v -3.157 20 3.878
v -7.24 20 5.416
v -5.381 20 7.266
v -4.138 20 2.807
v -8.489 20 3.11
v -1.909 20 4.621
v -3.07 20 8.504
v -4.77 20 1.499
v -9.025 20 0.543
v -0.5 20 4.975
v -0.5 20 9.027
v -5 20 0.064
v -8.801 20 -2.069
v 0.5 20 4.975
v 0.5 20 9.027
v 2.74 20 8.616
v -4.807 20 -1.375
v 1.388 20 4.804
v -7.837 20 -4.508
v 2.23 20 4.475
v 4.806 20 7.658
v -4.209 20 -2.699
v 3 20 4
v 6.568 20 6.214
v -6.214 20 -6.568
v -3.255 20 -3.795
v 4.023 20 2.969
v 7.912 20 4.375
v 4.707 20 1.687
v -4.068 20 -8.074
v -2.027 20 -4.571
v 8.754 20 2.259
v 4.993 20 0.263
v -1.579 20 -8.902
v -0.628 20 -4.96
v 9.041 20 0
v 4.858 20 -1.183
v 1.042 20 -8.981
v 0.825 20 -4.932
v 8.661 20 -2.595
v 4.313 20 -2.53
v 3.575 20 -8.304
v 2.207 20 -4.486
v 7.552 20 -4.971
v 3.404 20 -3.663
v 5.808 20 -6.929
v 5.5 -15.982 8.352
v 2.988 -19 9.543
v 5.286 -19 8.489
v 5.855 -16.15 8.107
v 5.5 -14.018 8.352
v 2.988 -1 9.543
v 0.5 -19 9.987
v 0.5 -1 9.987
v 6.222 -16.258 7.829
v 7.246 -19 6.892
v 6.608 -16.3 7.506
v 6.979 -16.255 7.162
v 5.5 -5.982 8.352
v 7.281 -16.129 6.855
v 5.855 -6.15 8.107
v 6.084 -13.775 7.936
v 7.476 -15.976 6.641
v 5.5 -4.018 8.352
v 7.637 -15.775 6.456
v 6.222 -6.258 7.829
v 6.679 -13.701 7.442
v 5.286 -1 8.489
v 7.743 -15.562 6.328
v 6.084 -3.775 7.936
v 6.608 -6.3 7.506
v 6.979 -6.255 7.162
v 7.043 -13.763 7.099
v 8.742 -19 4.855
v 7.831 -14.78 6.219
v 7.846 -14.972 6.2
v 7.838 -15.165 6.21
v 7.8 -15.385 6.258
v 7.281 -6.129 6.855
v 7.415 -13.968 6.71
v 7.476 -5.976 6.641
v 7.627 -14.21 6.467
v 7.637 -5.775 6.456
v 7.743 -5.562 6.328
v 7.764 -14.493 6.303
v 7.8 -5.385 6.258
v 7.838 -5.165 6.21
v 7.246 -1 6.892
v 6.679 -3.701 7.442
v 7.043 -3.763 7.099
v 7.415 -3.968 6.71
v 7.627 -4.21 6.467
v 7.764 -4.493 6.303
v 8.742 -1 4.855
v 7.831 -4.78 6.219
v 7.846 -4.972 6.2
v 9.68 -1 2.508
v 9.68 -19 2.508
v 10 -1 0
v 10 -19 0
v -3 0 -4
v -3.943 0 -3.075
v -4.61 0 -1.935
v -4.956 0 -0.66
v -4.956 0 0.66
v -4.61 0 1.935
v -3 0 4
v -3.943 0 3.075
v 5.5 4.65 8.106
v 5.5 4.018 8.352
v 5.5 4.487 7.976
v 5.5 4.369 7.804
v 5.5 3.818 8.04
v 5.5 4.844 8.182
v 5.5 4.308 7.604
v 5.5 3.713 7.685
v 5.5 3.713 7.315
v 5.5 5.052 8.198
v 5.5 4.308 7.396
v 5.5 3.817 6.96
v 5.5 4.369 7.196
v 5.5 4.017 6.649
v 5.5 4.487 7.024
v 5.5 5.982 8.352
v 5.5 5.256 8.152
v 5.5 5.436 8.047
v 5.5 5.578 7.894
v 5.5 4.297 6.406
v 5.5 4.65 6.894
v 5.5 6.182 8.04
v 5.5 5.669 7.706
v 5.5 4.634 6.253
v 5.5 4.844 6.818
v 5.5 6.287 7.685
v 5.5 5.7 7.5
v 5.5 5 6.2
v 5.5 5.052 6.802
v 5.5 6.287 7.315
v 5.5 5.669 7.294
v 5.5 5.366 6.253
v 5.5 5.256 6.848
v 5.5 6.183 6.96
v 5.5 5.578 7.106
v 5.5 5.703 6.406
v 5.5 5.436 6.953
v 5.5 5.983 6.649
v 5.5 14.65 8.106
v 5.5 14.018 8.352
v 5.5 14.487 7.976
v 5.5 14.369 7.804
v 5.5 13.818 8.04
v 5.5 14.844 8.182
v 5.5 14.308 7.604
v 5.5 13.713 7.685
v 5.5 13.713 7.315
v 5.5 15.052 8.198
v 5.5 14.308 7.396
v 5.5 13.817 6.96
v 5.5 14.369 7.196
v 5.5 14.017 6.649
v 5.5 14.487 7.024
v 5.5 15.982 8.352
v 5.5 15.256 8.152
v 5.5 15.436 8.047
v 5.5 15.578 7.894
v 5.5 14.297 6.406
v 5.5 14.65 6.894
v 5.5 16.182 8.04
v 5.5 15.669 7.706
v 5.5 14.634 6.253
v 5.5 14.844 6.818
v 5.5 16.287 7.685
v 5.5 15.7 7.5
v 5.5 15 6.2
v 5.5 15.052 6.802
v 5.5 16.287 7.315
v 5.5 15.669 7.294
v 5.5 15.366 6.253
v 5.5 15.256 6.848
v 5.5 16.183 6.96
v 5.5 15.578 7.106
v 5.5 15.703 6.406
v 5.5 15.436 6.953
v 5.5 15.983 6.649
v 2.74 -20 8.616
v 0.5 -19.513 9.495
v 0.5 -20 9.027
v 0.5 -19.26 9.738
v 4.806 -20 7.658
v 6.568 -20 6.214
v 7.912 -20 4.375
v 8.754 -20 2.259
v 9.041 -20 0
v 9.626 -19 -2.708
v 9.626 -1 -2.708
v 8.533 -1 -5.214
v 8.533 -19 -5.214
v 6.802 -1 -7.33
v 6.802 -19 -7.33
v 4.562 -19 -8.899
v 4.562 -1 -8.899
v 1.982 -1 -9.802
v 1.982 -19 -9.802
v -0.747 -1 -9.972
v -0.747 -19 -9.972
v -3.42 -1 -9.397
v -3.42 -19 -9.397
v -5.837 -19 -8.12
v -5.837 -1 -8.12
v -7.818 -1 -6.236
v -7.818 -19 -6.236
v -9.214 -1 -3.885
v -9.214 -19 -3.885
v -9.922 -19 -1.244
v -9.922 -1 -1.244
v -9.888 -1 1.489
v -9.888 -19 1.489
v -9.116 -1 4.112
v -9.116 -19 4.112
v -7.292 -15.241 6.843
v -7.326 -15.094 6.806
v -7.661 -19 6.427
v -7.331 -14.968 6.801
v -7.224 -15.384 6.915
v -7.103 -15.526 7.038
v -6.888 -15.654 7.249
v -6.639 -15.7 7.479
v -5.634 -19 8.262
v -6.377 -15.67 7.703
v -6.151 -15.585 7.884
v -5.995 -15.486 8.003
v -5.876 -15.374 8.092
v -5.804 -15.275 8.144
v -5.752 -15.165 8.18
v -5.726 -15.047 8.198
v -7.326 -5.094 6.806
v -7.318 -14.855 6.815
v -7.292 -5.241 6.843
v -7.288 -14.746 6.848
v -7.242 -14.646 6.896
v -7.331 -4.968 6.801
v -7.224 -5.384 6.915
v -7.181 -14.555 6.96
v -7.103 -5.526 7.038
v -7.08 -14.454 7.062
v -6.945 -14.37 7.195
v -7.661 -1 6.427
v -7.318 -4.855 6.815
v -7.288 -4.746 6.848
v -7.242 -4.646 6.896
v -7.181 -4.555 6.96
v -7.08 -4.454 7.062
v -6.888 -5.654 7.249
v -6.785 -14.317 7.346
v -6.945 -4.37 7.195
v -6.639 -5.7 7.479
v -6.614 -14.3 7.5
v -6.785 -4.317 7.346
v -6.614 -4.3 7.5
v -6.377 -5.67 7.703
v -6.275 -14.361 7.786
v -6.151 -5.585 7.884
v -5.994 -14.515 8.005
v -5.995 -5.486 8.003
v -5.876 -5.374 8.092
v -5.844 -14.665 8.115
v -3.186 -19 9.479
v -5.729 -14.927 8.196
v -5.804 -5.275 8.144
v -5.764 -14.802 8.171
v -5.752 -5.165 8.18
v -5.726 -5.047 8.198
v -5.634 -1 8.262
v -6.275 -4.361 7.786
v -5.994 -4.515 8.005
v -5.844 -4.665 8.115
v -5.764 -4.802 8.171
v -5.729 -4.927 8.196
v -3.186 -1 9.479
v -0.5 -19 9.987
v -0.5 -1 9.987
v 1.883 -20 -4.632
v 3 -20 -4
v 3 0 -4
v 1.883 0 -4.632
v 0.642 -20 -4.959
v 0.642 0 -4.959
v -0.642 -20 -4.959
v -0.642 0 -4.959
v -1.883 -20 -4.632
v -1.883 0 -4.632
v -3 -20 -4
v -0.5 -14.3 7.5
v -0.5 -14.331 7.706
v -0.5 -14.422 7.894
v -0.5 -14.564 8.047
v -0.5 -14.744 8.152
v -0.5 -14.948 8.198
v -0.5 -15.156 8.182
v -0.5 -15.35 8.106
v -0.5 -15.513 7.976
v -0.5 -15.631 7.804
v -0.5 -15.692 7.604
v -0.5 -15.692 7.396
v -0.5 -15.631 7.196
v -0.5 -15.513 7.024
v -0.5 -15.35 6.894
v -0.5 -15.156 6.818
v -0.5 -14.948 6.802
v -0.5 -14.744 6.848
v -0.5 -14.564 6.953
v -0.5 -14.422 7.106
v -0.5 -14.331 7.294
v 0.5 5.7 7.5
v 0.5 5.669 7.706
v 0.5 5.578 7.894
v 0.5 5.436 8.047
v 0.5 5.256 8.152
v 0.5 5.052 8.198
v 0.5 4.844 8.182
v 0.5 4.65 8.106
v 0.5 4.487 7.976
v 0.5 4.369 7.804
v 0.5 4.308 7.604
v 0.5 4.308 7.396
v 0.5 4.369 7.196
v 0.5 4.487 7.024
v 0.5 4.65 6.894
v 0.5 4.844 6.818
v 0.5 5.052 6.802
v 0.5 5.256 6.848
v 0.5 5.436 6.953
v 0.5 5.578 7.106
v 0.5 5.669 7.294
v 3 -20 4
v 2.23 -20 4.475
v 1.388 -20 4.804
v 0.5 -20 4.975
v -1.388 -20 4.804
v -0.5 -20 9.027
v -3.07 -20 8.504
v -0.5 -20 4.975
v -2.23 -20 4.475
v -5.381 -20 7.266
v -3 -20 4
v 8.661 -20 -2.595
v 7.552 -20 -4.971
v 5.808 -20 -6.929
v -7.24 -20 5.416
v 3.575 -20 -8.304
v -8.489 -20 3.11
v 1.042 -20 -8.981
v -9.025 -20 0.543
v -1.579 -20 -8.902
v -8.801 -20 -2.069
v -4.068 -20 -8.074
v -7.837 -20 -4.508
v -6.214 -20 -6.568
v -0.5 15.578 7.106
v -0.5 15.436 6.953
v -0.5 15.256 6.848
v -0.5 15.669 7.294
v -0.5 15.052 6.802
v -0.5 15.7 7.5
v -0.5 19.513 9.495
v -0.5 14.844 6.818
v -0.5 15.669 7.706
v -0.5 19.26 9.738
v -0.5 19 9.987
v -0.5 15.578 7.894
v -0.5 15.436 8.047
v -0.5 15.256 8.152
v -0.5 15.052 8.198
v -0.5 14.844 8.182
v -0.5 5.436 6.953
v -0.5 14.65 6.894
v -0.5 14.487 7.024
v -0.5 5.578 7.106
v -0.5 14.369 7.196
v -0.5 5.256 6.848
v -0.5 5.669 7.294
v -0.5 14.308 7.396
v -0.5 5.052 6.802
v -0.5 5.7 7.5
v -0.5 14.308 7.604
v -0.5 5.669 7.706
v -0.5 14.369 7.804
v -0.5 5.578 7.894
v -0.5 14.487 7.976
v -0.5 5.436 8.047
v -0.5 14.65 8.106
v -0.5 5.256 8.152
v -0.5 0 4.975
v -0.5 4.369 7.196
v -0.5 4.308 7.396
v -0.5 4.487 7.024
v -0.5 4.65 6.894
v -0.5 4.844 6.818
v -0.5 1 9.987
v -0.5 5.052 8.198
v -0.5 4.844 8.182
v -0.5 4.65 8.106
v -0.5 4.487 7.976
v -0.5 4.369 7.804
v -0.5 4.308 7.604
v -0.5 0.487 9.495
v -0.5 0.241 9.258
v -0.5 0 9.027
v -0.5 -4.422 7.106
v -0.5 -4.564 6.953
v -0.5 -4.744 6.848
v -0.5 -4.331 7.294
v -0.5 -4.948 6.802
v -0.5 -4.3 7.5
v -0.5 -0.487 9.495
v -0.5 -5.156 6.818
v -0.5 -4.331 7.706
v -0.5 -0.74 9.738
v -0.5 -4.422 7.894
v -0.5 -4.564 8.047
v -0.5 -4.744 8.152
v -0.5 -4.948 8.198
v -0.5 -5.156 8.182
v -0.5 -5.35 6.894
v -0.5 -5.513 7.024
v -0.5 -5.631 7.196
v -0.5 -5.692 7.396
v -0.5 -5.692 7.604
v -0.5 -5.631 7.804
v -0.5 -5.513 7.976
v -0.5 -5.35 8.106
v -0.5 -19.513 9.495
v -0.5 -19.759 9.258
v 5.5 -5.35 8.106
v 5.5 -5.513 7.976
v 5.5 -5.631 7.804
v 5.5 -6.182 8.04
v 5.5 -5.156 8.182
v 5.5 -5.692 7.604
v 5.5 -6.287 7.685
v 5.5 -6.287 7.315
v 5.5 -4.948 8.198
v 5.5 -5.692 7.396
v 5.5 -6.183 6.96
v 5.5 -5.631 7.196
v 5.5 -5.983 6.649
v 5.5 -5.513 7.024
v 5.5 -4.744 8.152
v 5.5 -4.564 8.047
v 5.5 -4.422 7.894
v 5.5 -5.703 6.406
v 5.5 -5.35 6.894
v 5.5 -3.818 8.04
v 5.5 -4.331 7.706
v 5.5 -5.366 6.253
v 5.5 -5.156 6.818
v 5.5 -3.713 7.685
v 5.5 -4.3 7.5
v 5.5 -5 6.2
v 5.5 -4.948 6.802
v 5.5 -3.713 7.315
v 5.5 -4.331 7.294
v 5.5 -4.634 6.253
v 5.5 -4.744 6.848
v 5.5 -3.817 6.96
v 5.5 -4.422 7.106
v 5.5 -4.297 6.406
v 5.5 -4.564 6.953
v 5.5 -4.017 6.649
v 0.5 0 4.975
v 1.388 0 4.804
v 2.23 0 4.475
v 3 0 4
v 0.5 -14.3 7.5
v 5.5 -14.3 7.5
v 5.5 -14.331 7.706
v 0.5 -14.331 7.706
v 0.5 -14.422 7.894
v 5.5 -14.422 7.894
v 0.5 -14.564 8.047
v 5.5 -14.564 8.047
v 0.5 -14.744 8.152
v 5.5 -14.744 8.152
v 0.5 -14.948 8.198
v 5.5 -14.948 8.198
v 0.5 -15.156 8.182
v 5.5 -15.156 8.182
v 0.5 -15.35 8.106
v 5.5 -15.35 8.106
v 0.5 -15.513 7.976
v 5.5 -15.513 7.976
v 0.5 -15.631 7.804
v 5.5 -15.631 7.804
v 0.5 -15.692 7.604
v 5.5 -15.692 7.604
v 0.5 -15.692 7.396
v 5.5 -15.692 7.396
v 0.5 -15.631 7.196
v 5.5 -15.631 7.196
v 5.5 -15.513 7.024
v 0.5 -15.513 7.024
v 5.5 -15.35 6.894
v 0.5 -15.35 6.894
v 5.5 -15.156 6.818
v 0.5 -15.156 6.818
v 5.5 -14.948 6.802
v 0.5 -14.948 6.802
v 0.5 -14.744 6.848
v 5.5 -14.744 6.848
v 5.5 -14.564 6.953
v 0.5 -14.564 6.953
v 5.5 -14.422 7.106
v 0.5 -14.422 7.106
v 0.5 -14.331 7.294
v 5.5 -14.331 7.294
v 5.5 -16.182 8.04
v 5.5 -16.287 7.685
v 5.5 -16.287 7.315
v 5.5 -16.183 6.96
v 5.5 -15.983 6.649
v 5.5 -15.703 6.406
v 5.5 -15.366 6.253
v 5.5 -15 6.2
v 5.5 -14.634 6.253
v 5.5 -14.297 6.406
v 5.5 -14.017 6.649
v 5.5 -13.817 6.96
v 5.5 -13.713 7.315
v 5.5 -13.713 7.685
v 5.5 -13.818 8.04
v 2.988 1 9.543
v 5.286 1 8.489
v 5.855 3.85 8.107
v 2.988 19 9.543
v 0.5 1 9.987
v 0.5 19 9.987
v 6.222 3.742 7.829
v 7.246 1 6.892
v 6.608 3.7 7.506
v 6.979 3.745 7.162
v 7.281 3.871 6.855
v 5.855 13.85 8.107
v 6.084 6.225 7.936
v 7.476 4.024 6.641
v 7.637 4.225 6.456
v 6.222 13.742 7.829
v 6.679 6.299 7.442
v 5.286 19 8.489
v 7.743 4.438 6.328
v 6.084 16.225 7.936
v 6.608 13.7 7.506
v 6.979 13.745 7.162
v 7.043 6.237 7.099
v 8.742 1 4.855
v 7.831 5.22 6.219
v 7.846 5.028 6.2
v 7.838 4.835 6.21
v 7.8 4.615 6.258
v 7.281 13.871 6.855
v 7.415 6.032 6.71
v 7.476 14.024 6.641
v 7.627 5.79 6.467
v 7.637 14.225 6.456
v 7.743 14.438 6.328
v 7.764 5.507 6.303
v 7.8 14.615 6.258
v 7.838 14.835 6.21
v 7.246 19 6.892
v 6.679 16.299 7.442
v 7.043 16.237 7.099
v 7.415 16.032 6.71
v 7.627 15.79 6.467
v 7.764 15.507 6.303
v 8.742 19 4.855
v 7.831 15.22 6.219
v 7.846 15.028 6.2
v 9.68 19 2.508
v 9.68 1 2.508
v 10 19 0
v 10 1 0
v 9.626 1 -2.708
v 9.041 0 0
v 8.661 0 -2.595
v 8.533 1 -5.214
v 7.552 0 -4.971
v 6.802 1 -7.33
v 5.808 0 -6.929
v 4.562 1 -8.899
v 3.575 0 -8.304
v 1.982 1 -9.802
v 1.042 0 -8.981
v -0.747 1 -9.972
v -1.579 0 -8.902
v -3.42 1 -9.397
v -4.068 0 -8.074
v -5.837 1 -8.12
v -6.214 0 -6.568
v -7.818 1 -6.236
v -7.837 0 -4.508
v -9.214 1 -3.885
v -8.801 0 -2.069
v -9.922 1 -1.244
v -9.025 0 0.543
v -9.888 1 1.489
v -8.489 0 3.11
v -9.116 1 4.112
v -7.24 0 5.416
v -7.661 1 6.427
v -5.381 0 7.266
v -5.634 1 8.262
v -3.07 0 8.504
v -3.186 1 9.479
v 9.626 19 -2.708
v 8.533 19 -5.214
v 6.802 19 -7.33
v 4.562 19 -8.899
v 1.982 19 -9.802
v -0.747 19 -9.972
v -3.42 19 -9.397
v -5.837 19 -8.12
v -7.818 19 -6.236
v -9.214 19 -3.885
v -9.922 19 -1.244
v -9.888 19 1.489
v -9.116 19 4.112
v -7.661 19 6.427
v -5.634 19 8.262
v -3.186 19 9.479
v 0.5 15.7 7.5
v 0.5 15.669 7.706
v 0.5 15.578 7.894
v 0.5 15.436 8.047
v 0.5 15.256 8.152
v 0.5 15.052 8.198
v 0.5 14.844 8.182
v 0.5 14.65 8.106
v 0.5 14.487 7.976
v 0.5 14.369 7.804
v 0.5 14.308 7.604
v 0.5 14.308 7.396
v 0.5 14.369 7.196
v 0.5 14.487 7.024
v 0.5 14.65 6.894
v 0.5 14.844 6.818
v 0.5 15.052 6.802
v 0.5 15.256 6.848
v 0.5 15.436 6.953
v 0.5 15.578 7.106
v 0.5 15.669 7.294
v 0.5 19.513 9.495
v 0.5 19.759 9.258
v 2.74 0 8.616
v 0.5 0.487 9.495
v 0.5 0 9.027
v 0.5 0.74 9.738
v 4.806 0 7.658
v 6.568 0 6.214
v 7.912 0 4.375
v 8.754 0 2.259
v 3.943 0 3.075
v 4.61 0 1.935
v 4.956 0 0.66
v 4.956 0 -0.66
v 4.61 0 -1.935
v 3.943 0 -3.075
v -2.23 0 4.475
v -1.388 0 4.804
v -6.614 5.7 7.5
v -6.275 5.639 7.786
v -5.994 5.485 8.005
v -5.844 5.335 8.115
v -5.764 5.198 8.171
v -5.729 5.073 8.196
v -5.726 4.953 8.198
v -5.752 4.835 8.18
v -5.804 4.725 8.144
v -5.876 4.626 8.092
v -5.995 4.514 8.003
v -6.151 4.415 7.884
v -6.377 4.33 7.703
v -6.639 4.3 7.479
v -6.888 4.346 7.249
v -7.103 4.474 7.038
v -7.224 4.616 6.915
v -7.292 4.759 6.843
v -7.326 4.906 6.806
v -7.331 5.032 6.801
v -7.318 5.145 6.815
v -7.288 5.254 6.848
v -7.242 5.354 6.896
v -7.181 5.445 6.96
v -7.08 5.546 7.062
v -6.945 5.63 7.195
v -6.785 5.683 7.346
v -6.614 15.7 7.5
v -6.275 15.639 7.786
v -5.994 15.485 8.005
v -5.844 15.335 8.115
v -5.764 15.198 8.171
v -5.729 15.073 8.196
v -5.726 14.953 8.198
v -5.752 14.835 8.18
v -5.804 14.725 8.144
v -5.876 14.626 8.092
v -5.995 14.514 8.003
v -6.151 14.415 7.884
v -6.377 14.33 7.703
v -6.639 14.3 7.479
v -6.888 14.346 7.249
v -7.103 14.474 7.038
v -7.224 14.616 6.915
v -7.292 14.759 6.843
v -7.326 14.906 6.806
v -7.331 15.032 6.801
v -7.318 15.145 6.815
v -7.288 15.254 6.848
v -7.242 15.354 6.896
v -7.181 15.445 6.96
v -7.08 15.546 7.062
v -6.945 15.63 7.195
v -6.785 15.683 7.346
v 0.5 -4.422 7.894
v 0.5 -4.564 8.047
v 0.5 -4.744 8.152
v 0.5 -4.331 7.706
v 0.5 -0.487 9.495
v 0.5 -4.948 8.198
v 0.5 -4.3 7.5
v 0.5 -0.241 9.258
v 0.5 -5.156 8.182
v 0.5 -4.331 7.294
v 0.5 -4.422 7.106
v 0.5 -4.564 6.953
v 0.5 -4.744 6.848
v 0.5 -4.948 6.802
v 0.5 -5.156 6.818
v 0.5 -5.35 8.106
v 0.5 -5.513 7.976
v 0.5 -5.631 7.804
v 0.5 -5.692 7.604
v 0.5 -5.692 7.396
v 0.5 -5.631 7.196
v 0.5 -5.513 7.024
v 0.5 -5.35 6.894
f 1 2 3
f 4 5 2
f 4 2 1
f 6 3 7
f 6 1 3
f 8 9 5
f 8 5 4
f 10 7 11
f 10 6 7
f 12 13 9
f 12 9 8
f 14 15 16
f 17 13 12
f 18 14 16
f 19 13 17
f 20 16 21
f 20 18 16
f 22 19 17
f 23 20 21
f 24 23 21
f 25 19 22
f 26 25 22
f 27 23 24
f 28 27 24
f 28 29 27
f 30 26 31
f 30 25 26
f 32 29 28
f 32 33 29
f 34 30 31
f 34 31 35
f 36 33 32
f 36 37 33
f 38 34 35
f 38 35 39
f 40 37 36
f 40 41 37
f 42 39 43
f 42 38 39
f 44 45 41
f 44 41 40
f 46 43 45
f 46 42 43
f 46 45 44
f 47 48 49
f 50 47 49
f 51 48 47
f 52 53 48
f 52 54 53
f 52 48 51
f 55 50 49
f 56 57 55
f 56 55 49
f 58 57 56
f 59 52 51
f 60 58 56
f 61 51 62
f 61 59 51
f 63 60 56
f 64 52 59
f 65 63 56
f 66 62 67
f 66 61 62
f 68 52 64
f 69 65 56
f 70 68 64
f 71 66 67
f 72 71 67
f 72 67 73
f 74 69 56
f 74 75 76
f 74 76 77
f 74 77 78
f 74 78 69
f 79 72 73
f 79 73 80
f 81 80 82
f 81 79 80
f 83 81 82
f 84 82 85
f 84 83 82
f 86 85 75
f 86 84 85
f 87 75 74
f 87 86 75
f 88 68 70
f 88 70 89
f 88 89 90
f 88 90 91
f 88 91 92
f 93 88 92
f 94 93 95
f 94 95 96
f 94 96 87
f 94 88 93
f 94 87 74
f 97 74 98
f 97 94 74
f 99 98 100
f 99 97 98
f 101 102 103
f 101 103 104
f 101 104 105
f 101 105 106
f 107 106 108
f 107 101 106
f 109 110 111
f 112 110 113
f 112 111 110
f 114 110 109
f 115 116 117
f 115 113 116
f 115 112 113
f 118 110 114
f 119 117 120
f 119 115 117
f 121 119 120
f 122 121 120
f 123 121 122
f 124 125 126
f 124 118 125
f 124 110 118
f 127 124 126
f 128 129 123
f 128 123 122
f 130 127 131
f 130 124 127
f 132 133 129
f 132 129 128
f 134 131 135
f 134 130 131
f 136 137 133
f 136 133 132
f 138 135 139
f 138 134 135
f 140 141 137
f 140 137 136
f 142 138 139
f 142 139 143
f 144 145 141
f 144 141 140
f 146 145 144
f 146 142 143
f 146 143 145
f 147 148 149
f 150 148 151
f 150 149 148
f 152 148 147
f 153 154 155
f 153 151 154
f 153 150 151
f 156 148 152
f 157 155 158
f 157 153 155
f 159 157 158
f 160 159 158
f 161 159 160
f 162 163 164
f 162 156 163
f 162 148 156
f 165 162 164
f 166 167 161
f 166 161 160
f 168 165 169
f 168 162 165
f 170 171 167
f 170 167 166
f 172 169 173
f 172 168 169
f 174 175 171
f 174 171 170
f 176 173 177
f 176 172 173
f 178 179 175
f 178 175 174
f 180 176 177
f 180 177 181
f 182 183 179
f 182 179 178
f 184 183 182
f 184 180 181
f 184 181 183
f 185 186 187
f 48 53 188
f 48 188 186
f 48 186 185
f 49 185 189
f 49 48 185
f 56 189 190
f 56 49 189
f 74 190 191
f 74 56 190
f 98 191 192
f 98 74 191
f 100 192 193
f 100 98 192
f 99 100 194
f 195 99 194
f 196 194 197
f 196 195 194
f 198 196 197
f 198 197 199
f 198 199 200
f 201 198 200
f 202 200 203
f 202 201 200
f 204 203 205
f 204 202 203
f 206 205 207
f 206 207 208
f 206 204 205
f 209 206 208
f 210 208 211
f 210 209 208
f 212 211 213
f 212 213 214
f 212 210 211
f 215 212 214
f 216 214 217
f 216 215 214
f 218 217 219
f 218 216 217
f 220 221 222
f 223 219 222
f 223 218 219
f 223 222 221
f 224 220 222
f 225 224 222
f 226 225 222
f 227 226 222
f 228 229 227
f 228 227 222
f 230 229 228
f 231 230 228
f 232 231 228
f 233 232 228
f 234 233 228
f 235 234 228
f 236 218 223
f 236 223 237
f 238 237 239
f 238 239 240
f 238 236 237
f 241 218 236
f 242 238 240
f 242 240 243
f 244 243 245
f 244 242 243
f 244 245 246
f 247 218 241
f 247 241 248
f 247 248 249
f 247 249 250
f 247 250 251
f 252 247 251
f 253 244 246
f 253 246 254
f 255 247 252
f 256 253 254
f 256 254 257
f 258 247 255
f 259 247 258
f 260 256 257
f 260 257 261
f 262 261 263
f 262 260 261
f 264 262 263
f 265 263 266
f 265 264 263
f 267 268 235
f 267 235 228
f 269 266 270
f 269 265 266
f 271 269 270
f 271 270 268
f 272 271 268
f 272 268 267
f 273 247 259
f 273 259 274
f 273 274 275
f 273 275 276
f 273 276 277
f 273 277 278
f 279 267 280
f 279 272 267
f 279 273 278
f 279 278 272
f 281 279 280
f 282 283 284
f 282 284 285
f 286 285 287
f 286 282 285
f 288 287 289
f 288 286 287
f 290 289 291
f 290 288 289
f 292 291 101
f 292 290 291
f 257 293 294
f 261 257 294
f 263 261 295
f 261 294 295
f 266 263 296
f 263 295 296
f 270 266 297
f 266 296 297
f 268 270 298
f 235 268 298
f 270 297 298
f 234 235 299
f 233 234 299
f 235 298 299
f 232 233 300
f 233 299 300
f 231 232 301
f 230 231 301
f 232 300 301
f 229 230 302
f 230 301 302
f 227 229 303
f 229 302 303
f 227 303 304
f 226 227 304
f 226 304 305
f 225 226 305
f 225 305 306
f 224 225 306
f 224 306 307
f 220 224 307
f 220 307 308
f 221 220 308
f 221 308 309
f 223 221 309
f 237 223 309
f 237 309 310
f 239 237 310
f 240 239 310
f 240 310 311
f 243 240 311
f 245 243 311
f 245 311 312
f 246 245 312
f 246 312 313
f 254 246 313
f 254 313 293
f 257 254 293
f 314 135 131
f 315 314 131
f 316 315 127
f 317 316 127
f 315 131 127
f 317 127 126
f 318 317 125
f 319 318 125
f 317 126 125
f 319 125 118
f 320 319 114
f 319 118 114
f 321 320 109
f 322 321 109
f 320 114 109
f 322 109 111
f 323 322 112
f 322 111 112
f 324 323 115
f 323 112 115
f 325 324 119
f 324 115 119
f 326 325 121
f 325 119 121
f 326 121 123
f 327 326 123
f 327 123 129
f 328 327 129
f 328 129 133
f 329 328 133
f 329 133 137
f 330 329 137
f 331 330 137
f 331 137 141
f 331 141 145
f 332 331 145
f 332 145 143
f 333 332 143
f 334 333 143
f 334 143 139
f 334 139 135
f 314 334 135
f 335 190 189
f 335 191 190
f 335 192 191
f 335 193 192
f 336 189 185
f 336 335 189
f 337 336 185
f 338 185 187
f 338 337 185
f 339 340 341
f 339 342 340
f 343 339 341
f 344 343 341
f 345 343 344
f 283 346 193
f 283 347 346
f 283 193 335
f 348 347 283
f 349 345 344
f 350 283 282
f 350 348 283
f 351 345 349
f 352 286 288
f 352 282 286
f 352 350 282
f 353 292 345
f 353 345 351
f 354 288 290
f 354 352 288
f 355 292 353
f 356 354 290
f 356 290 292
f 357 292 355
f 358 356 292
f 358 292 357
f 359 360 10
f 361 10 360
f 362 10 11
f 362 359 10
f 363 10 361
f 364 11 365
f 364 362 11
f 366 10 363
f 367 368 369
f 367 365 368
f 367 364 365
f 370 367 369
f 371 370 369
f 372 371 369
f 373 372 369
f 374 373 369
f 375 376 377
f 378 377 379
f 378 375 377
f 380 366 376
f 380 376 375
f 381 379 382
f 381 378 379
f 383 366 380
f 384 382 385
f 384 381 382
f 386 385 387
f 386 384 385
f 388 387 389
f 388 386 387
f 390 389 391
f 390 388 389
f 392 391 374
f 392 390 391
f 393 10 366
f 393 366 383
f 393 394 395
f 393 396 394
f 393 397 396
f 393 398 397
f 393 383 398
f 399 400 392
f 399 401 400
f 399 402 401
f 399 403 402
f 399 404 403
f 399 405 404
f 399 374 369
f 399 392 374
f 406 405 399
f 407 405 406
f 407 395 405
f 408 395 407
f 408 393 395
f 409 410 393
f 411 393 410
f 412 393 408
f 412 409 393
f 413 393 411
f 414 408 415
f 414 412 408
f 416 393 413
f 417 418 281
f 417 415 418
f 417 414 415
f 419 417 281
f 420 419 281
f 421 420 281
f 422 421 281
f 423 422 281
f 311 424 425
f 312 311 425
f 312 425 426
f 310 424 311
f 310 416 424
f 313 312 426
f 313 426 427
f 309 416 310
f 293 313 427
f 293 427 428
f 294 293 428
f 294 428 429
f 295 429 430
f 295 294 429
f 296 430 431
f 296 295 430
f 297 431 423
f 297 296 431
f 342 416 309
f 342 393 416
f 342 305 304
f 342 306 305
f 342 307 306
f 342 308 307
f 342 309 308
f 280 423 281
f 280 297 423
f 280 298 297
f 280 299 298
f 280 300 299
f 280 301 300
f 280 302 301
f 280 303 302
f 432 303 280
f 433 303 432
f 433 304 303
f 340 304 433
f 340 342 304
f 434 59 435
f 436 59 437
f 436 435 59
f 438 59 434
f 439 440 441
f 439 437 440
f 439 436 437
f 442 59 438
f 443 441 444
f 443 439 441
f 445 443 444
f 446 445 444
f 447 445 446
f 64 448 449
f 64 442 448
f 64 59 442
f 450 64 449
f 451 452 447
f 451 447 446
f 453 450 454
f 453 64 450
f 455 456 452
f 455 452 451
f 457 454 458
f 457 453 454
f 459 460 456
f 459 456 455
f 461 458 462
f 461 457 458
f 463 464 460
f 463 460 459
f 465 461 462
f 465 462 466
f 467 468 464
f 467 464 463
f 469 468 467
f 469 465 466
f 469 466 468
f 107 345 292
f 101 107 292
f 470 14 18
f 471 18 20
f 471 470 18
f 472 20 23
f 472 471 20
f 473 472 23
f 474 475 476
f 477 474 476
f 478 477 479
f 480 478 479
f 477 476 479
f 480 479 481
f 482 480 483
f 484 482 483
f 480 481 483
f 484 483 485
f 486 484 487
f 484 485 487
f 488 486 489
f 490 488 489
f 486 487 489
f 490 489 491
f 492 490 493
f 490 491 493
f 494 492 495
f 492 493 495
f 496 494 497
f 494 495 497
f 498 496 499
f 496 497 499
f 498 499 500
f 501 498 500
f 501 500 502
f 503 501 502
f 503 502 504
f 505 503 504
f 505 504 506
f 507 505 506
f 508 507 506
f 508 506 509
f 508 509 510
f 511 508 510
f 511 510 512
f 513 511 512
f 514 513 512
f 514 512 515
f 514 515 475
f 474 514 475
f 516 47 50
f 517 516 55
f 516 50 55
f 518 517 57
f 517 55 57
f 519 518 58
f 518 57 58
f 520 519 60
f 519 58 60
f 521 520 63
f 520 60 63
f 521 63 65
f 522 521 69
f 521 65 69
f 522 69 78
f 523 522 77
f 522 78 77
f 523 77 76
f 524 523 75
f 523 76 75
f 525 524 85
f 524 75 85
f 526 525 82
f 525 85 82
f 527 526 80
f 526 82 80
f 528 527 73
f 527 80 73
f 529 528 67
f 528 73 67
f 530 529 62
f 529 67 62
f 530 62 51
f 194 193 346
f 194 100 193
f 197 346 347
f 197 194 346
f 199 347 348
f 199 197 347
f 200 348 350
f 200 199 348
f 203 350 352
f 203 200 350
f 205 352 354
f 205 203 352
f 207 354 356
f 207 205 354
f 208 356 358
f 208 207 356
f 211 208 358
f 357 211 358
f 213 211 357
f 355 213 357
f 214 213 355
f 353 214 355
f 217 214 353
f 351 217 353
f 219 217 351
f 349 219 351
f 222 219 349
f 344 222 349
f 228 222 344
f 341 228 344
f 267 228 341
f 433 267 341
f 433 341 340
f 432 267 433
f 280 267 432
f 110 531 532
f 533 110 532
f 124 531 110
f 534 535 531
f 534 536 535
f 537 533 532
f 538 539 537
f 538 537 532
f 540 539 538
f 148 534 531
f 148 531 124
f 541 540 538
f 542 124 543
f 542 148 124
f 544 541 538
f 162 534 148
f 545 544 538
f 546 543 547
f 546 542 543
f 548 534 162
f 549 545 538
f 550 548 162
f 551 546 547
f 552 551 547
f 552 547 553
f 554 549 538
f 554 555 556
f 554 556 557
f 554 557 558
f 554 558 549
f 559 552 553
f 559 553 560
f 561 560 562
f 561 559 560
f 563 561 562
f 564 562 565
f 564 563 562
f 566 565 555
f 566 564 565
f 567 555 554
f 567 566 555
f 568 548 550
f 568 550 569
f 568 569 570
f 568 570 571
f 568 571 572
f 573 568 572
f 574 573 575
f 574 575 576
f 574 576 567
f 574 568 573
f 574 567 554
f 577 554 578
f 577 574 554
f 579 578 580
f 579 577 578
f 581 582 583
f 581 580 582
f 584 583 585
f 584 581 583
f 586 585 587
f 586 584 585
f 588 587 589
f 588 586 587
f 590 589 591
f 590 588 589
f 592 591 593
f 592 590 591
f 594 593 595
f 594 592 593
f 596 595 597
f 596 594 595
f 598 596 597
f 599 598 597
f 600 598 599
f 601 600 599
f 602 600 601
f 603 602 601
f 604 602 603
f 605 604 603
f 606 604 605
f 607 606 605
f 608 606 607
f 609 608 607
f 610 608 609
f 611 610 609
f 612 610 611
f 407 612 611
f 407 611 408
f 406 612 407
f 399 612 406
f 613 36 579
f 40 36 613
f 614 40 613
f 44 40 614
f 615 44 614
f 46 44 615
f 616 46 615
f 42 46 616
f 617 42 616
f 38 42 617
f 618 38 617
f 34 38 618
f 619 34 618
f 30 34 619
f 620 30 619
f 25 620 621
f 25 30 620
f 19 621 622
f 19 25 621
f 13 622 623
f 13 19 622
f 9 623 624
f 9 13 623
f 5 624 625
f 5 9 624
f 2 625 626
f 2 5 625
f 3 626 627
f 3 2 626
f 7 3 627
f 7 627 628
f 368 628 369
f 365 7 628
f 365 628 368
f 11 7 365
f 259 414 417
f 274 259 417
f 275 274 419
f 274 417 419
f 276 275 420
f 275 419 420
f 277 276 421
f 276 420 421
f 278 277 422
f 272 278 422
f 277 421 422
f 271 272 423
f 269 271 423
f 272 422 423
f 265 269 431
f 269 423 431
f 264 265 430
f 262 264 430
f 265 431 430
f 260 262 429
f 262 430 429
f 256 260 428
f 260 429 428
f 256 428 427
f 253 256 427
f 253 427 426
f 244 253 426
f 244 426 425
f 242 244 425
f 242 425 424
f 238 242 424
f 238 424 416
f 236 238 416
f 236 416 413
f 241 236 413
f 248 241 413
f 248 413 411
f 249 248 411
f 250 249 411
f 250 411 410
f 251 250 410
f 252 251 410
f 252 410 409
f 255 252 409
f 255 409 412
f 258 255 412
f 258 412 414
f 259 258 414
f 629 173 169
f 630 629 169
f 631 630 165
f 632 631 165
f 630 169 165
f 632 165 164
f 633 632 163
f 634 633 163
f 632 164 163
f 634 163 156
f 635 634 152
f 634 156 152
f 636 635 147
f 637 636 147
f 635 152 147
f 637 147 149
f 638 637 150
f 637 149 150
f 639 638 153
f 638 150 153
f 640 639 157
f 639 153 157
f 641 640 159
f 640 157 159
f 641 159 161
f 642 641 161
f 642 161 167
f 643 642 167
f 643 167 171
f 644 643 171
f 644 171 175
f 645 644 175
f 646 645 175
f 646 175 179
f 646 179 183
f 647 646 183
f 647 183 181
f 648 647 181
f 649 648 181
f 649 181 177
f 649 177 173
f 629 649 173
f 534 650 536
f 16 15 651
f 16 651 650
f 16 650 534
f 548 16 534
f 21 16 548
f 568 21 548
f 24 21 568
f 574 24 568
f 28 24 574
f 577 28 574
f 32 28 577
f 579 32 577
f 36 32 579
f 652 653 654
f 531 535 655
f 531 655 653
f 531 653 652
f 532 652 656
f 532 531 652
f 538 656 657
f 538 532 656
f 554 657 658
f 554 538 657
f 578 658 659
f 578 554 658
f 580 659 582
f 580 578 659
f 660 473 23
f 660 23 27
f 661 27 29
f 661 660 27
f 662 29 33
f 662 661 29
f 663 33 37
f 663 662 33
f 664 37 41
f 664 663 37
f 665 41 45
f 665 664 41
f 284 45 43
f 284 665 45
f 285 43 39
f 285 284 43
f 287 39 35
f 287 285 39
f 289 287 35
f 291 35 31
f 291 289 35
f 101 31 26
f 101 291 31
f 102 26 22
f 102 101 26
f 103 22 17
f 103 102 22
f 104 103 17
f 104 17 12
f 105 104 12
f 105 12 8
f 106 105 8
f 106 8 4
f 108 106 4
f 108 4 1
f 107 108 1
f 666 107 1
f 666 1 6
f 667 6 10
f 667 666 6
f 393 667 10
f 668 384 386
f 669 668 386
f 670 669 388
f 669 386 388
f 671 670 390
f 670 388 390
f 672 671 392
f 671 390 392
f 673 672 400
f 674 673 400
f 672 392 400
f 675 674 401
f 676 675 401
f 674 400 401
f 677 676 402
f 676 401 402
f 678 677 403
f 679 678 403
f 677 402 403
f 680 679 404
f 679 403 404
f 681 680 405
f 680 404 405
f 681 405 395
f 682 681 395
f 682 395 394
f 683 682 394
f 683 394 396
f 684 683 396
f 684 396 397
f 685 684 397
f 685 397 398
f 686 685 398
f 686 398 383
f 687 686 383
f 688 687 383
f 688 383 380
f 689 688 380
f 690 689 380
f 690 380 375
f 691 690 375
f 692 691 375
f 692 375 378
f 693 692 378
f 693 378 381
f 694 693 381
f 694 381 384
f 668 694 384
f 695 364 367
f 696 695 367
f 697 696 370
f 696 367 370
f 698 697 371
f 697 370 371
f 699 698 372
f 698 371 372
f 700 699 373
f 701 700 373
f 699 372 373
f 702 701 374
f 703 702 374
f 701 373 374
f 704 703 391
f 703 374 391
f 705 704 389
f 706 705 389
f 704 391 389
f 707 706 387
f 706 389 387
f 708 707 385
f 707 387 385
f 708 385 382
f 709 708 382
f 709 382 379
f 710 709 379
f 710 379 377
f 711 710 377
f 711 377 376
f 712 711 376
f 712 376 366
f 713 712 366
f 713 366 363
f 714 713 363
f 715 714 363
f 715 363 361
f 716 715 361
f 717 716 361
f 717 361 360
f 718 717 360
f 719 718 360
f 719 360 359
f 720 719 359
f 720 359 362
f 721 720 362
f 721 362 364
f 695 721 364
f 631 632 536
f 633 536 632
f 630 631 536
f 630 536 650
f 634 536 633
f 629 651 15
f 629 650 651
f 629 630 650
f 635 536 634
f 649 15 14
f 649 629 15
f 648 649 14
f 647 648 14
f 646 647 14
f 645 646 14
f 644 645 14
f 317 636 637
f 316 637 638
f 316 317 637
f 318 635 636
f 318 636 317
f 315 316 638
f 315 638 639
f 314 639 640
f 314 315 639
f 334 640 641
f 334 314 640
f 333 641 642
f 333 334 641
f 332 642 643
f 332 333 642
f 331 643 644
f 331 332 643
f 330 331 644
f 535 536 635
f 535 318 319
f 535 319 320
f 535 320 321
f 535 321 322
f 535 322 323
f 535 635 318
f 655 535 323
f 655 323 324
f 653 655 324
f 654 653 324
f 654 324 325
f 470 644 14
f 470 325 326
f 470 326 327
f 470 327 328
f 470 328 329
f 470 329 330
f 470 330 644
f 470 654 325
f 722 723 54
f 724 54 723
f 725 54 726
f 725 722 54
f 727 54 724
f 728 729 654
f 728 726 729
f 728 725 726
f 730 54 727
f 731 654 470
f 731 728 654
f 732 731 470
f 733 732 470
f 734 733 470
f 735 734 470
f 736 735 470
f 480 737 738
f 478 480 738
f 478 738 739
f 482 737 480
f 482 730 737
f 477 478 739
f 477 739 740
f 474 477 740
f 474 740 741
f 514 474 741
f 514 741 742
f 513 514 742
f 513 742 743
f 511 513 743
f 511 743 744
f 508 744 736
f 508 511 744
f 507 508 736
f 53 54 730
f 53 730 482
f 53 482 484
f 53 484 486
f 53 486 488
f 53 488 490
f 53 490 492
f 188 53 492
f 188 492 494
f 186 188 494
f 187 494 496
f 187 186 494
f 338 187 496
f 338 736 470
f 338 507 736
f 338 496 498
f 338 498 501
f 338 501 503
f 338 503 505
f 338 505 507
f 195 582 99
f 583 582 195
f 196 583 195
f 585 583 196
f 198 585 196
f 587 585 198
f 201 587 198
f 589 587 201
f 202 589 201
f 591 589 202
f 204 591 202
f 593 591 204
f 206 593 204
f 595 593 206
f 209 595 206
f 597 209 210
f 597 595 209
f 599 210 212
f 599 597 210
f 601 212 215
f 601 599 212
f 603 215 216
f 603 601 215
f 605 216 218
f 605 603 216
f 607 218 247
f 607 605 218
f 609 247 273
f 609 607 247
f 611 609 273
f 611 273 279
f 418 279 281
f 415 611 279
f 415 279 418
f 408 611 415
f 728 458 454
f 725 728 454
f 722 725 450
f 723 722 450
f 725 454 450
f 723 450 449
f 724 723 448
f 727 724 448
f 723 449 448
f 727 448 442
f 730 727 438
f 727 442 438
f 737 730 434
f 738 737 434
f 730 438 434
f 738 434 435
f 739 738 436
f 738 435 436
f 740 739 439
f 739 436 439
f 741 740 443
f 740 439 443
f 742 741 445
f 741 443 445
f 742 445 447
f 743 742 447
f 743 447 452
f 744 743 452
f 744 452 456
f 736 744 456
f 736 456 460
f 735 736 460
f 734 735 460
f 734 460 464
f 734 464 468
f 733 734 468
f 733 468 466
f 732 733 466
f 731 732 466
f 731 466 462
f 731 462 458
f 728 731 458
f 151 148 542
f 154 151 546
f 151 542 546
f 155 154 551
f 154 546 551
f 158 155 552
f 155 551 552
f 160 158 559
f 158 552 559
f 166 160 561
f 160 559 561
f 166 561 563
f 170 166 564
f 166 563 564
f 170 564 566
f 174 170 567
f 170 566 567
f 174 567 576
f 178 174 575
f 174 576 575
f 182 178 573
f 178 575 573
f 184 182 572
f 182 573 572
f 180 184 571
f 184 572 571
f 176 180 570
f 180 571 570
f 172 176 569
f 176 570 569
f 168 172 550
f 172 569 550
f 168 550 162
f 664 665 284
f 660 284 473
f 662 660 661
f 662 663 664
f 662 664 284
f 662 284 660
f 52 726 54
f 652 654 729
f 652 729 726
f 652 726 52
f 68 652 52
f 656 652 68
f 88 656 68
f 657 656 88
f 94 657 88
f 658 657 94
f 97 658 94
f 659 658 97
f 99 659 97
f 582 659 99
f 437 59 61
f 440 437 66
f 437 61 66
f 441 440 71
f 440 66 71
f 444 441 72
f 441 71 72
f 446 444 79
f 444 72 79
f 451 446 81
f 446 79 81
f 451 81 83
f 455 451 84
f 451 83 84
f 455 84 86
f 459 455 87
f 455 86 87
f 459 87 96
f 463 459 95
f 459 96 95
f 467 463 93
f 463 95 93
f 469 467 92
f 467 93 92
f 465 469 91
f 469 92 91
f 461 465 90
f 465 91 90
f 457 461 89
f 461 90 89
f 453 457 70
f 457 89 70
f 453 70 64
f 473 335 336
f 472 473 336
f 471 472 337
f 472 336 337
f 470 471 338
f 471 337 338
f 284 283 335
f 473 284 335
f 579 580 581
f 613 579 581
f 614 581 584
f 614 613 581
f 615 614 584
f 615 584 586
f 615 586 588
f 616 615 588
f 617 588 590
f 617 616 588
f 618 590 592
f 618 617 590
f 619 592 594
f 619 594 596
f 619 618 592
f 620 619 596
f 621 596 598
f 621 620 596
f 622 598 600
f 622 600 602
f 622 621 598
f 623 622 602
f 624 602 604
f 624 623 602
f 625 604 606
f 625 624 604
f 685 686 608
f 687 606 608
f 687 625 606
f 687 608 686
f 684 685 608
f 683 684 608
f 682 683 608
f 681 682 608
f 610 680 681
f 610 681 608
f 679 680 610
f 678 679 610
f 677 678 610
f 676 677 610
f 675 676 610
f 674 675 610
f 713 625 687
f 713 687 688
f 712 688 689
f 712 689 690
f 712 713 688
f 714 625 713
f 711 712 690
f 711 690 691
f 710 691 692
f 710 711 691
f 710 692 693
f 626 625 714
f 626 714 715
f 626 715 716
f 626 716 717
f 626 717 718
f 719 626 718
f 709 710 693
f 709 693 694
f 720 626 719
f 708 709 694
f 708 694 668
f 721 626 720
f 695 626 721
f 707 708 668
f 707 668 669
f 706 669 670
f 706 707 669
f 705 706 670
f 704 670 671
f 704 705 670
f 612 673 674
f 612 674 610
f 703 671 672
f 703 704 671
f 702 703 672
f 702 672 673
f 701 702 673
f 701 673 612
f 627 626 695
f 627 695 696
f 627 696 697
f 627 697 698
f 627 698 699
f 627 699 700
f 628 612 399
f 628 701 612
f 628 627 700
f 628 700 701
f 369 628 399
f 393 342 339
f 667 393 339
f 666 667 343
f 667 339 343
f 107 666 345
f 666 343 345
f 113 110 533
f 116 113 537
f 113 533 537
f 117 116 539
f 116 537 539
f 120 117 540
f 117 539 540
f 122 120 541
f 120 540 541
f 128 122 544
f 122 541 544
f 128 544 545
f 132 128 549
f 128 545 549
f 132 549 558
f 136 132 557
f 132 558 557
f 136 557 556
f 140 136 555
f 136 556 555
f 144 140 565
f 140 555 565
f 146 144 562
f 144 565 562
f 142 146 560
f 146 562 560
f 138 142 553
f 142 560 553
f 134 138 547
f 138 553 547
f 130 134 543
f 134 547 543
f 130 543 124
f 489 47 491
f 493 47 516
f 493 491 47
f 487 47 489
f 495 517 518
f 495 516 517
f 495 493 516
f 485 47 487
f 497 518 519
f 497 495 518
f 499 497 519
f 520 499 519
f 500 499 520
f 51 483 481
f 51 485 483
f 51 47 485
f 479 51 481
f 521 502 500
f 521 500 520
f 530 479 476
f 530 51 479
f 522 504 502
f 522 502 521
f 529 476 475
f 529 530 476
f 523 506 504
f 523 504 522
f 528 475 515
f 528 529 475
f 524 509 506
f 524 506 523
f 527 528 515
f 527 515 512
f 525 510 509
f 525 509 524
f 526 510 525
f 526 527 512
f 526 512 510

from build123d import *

# Parameters (mm, degrees)
CUT_EXTRUDE2_DEPTH      = 20
CUT_EXTRUDE3_START      = -20
SKETCH8_R               = 5
CUT_EXTRUDE3_DEPTH      = 20
CUT_EXTRUDE4_DEPTH      = 43.426406871
CUT_EXTRUDE4_DEPTH_BACK = 43.426406871
SKETCH11_R              = 0.7
CUT_EXTRUDE5_DEPTH      = 30.669007398
SKETCH13_R              = 1.3
CUT_EXTRUDE6_DEPTH      = 4


with BuildPart() as part:
    # Sketch5 → Revolve2 (revolve)
    with BuildSketch(Plane.XY, mode=Mode.PRIVATE) as revolve2_sk:
        Polygon((-9.041219405, 20), (0, 20), (0, -20), (-9.041219405, -20), (-10, -19), (-10, -1), (-9.041219405, 0), (-10, 1), (-10, 19), align=None)
    revolve(revolve2_sk.sketch.rotate(Axis((0, -53.191489362, 0), (0, 1, 0)), 180), axis=Axis((0, -53.191489362, 0), (0, 1, 0)))

    # Sketch6 → Cut-Extrude2 (cut)
    with BuildSketch(Plane(origin=(0, -20, 0), x_dir=(-1, 0, 0), z_dir=(0, -1, 0))):
        with BuildLine():
            Line((-3, 4), (-3, -4))
            ThreePointArc((-3, -4), (0, -5), (3, -4))
            Line((3, -4), (3, 4))
            ThreePointArc((3, 4), (0, 5), (-3, 4))
        make_face()
    extrude(amount=-CUT_EXTRUDE2_DEPTH, mode=Mode.SUBTRACT)

    # Sketch8 → Cut-Extrude3 (cut)
    with BuildSketch(Plane(origin=(0, 20, 0), x_dir=(1, 0, 0), z_dir=(0, 1, 0)).offset(CUT_EXTRUDE3_START)):
        with Locations(Location((0, 0, 0), (0, 0, 306.869897646))):
            Circle(SKETCH8_R)
    extrude(amount=CUT_EXTRUDE3_DEPTH, mode=Mode.SUBTRACT)

    # Sketch9 → Cut-Extrude4 (cut, two sides: drawn at the far end of the back side and taken through both)
    with BuildSketch(Plane(origin=(0, 20, 0), x_dir=(1, 0, 0), z_dir=(0, 1, 0)).offset(-CUT_EXTRUDE4_DEPTH_BACK)):
        with BuildLine():
            Line((-0.5, -4.974937186), (-0.5, -10.403800493))
            ThreePointArc((-0.5, -10.403800493), (0, -10.415808404), (0.5, -10.403800493))
            Line((0.5, -10.403800493), (0.5, -4.974937186))
            ThreePointArc((0.5, -4.974937186), (0, -5), (-0.5, -4.974937186))
        make_face()
    extrude(amount=CUT_EXTRUDE4_DEPTH + CUT_EXTRUDE4_DEPTH_BACK, mode=Mode.SUBTRACT)

    # Sketch11 → Cut-Extrude5 (cut, through all)
    with BuildSketch(Plane(origin=(9.5, 0, 0), x_dir=(0, 0, -1), z_dir=(1, 0, 0))):
        with Locations(Location((-7.5, 15, 0), (0, 0, 90))):
            Circle(SKETCH11_R)
        with Locations(Location((-7.5, 5, 0), (0, 0, 90))):
            Circle(SKETCH11_R)
        with Locations(Location((-7.5, -5, 0), (0, 0, 90))):
            Circle(SKETCH11_R)
        with Locations(Location((-7.5, -15, 0), (0, 0, 90))):
            Circle(SKETCH11_R)
    extrude(amount=-CUT_EXTRUDE5_DEPTH, mode=Mode.SUBTRACT)

    # Sketch13 → Cut-Extrude6 (cut)
    with BuildSketch(Plane(origin=(9.5, 0, 0), x_dir=(0, 0, -1), z_dir=(1, 0, 0))):
        with Locations((-7.5, 15)):
            Circle(SKETCH13_R)
        with Locations((-7.5, 5)):
            Circle(SKETCH13_R)
        with Locations((-7.5, -5)):
            Circle(SKETCH13_R)
        with Locations((-7.5, -15)):
            Circle(SKETCH13_R)
    extrude(amount=-CUT_EXTRUDE6_DEPTH, mode=Mode.SUBTRACT)


solid = part.part
